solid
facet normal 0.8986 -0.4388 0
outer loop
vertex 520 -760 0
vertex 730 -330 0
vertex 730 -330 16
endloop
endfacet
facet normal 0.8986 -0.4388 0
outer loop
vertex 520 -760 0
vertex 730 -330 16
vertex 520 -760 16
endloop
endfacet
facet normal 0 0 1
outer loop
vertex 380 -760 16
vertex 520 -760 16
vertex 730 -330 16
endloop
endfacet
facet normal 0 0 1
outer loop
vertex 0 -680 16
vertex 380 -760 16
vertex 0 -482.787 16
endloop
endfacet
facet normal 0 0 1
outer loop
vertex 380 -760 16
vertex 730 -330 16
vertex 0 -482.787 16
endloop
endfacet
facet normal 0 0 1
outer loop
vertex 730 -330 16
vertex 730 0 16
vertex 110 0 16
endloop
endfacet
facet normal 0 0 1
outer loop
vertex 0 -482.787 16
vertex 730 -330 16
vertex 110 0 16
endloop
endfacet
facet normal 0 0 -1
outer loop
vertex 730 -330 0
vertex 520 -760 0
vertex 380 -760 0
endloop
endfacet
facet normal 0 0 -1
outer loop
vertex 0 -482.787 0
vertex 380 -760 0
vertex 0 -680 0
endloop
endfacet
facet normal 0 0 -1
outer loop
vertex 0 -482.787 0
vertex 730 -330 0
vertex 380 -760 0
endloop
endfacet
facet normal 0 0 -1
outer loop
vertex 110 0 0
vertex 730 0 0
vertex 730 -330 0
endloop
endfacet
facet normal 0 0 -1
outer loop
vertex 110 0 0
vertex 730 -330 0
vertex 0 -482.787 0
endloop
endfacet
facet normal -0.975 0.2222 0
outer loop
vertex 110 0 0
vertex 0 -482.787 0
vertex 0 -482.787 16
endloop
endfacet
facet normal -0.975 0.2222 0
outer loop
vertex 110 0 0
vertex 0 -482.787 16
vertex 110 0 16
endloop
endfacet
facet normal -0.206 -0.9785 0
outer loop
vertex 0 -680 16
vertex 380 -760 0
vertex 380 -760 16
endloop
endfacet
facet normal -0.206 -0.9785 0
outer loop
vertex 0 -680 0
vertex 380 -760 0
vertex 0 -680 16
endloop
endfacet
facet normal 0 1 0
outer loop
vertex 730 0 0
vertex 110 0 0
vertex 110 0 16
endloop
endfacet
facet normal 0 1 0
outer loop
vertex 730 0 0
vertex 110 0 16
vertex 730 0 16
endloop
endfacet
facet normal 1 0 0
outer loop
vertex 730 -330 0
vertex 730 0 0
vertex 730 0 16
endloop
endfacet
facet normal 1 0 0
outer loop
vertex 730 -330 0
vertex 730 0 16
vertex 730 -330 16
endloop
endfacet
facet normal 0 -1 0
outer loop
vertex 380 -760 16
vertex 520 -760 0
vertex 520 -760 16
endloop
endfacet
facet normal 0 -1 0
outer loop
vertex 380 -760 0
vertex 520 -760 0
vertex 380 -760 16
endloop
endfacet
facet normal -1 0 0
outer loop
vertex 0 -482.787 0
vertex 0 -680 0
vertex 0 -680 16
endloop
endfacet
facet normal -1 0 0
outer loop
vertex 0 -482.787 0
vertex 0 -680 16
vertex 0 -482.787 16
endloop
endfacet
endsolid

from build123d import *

# Parameters (mm, degrees)
SKETCH_1_R         = 13
EXTRUDE_1545_DEPTH = 16
EXTRUDE_1_DEPTH    = 16


with BuildPart() as part:
    # 草图1 → Extrude 1545 (new body)
    with BuildSketch(Plane.XY):
        Polygon((730, -330), (520, -760), (380, -760), (0, -680), (0, -482.786642105), (110, 0), (730, 0), align=None)
        with Locations((510, -70)):
            Circle(SKETCH_1_R, mode=Mode.SUBTRACT)
        with Locations((590, -70)):
            Circle(SKETCH_1_R, mode=Mode.SUBTRACT)
        with Locations((670, -70)):
            Circle(SKETCH_1_R, mode=Mode.SUBTRACT)
        with Locations((510, -150)):
            Circle(SKETCH_1_R, mode=Mode.SUBTRACT)
        with Locations((590, -150)):
            Circle(SKETCH_1_R, mode=Mode.SUBTRACT)
        with Locations((670, -150)):
            Circle(SKETCH_1_R, mode=Mode.SUBTRACT)
        with Locations((510, -230)):
            Circle(SKETCH_1_R, mode=Mode.SUBTRACT)
        with Locations((590, -230)):
            Circle(SKETCH_1_R, mode=Mode.SUBTRACT)
        with Locations((670, -230)):
            Circle(SKETCH_1_R, mode=Mode.SUBTRACT)
        with Locations(Location((230, -230, 0), (0, 0, 180))):
            Circle(SKETCH_1_R, mode=Mode.SUBTRACT)
        with Locations(Location((310, -230, 0), (0, 0, 180))):
            Circle(SKETCH_1_R, mode=Mode.SUBTRACT)
        with Locations(Location((390, -230, 0), (0, 0, 180))):
            Circle(SKETCH_1_R, mode=Mode.SUBTRACT)
        with Locations(Location((230, -150, 0), (0, 0, 180))):
            Circle(SKETCH_1_R, mode=Mode.SUBTRACT)
        with Locations(Location((310, -150, 0), (0, 0, 180))):
            Circle(SKETCH_1_R, mode=Mode.SUBTRACT)
        with Locations(Location((390, -150, 0), (0, 0, 180))):
            Circle(SKETCH_1_R, mode=Mode.SUBTRACT)
        with Locations(Location((230, -70, 0), (0, 0, 180))):
            Circle(SKETCH_1_R, mode=Mode.SUBTRACT)
        with Locations(Location((310, -70, 0), (0, 0, 180))):
            Circle(SKETCH_1_R, mode=Mode.SUBTRACT)
        with Locations(Location((390, -70, 0), (0, 0, 180))):
            Circle(SKETCH_1_R, mode=Mode.SUBTRACT)
        with Locations((150, -70)):
            Circle(SKETCH_1_R, mode=Mode.SUBTRACT)
        with Locations((150, -150)):
            Circle(SKETCH_1_R, mode=Mode.SUBTRACT)
        with Locations((150, -230)):
            Circle(SKETCH_1_R, mode=Mode.SUBTRACT)
        with Locations((590, -370)):
            Circle(SKETCH_1_R, mode=Mode.SUBTRACT)
        with Locations((510, -370)):
            Circle(SKETCH_1_R, mode=Mode.SUBTRACT)
        with Locations(Location((390, -370, 0), (0, 0, 180))):
            Circle(SKETCH_1_R, mode=Mode.SUBTRACT)
        with Locations(Location((310, -370, 0), (0, 0, 180))):
            Circle(SKETCH_1_R, mode=Mode.SUBTRACT)
        with Locations((506, -470)):
            Circle(SKETCH_1_R, mode=Mode.SUBTRACT)
        with Locations((506, -550)):
            Circle(SKETCH_1_R, mode=Mode.SUBTRACT)
        with Locations((506, -630)):
            Circle(SKETCH_1_R, mode=Mode.SUBTRACT)
        with Locations((506, -710)):
            Circle(SKETCH_1_R, mode=Mode.SUBTRACT)
        with Locations(Location((394, -710, 0), (0, 0, 180))):
            Circle(SKETCH_1_R, mode=Mode.SUBTRACT)
        with Locations(Location((394, -630, 0), (0, 0, 180))):
            Circle(SKETCH_1_R, mode=Mode.SUBTRACT)
        with Locations(Location((394, -550, 0), (0, 0, 180))):
            Circle(SKETCH_1_R, mode=Mode.SUBTRACT)
        with Locations(Location((394, -470, 0), (0, 0, 180))):
            Circle(SKETCH_1_R, mode=Mode.SUBTRACT)
        with Locations((149.479377198, -397.484050539)):
            Circle(SKETCH_1_R, mode=Mode.SUBTRACT)
        with Locations((99.493096694, -459.945012437)):
            Circle(SKETCH_1_R, mode=Mode.SUBTRACT)
        with Locations((49.506816189, -522.405974336)):
            Circle(SKETCH_1_R, mode=Mode.SUBTRACT)
        with Locations((61.981497584, -634.85321674)):
            Circle(SKETCH_1_R, mode=Mode.SUBTRACT)
        with Locations((111.967778088, -572.392254841)):
            Circle(SKETCH_1_R, mode=Mode.SUBTRACT)
        with Locations((161.954058593, -509.931292942)):
            Circle(SKETCH_1_R, mode=Mode.SUBTRACT)
        with Locations((211.940339097, -447.470331043)):
            Circle(SKETCH_1_R, mode=Mode.SUBTRACT)
        with Locations(Location((174.428739987, -622.378535345, 0), (0, 0, 180))):
            Circle(SKETCH_1_R, mode=Mode.SUBTRACT)
        with Locations(Location((224.415020492, -559.917573446, 0), (0, 0, 180))):
            Circle(SKETCH_1_R, mode=Mode.SUBTRACT)
        with Locations(Location((274.401300996, -497.456611548, 0), (0, 0, 180))):
            Circle(SKETCH_1_R, mode=Mode.SUBTRACT)
    extrude(amount=EXTRUDE_1545_DEPTH)

    # 草图2 → 凸台-拉伸1 (add)
    with BuildSketch(Plane.XY.offset(16)):
        Polygon((110, 0), (730, 0), (730, -330), (520, -760), (380, -760), (0, -680), (0, -482.786642105), align=None)
    extrude(amount=-EXTRUDE_1_DEPTH)


solid = part.part
